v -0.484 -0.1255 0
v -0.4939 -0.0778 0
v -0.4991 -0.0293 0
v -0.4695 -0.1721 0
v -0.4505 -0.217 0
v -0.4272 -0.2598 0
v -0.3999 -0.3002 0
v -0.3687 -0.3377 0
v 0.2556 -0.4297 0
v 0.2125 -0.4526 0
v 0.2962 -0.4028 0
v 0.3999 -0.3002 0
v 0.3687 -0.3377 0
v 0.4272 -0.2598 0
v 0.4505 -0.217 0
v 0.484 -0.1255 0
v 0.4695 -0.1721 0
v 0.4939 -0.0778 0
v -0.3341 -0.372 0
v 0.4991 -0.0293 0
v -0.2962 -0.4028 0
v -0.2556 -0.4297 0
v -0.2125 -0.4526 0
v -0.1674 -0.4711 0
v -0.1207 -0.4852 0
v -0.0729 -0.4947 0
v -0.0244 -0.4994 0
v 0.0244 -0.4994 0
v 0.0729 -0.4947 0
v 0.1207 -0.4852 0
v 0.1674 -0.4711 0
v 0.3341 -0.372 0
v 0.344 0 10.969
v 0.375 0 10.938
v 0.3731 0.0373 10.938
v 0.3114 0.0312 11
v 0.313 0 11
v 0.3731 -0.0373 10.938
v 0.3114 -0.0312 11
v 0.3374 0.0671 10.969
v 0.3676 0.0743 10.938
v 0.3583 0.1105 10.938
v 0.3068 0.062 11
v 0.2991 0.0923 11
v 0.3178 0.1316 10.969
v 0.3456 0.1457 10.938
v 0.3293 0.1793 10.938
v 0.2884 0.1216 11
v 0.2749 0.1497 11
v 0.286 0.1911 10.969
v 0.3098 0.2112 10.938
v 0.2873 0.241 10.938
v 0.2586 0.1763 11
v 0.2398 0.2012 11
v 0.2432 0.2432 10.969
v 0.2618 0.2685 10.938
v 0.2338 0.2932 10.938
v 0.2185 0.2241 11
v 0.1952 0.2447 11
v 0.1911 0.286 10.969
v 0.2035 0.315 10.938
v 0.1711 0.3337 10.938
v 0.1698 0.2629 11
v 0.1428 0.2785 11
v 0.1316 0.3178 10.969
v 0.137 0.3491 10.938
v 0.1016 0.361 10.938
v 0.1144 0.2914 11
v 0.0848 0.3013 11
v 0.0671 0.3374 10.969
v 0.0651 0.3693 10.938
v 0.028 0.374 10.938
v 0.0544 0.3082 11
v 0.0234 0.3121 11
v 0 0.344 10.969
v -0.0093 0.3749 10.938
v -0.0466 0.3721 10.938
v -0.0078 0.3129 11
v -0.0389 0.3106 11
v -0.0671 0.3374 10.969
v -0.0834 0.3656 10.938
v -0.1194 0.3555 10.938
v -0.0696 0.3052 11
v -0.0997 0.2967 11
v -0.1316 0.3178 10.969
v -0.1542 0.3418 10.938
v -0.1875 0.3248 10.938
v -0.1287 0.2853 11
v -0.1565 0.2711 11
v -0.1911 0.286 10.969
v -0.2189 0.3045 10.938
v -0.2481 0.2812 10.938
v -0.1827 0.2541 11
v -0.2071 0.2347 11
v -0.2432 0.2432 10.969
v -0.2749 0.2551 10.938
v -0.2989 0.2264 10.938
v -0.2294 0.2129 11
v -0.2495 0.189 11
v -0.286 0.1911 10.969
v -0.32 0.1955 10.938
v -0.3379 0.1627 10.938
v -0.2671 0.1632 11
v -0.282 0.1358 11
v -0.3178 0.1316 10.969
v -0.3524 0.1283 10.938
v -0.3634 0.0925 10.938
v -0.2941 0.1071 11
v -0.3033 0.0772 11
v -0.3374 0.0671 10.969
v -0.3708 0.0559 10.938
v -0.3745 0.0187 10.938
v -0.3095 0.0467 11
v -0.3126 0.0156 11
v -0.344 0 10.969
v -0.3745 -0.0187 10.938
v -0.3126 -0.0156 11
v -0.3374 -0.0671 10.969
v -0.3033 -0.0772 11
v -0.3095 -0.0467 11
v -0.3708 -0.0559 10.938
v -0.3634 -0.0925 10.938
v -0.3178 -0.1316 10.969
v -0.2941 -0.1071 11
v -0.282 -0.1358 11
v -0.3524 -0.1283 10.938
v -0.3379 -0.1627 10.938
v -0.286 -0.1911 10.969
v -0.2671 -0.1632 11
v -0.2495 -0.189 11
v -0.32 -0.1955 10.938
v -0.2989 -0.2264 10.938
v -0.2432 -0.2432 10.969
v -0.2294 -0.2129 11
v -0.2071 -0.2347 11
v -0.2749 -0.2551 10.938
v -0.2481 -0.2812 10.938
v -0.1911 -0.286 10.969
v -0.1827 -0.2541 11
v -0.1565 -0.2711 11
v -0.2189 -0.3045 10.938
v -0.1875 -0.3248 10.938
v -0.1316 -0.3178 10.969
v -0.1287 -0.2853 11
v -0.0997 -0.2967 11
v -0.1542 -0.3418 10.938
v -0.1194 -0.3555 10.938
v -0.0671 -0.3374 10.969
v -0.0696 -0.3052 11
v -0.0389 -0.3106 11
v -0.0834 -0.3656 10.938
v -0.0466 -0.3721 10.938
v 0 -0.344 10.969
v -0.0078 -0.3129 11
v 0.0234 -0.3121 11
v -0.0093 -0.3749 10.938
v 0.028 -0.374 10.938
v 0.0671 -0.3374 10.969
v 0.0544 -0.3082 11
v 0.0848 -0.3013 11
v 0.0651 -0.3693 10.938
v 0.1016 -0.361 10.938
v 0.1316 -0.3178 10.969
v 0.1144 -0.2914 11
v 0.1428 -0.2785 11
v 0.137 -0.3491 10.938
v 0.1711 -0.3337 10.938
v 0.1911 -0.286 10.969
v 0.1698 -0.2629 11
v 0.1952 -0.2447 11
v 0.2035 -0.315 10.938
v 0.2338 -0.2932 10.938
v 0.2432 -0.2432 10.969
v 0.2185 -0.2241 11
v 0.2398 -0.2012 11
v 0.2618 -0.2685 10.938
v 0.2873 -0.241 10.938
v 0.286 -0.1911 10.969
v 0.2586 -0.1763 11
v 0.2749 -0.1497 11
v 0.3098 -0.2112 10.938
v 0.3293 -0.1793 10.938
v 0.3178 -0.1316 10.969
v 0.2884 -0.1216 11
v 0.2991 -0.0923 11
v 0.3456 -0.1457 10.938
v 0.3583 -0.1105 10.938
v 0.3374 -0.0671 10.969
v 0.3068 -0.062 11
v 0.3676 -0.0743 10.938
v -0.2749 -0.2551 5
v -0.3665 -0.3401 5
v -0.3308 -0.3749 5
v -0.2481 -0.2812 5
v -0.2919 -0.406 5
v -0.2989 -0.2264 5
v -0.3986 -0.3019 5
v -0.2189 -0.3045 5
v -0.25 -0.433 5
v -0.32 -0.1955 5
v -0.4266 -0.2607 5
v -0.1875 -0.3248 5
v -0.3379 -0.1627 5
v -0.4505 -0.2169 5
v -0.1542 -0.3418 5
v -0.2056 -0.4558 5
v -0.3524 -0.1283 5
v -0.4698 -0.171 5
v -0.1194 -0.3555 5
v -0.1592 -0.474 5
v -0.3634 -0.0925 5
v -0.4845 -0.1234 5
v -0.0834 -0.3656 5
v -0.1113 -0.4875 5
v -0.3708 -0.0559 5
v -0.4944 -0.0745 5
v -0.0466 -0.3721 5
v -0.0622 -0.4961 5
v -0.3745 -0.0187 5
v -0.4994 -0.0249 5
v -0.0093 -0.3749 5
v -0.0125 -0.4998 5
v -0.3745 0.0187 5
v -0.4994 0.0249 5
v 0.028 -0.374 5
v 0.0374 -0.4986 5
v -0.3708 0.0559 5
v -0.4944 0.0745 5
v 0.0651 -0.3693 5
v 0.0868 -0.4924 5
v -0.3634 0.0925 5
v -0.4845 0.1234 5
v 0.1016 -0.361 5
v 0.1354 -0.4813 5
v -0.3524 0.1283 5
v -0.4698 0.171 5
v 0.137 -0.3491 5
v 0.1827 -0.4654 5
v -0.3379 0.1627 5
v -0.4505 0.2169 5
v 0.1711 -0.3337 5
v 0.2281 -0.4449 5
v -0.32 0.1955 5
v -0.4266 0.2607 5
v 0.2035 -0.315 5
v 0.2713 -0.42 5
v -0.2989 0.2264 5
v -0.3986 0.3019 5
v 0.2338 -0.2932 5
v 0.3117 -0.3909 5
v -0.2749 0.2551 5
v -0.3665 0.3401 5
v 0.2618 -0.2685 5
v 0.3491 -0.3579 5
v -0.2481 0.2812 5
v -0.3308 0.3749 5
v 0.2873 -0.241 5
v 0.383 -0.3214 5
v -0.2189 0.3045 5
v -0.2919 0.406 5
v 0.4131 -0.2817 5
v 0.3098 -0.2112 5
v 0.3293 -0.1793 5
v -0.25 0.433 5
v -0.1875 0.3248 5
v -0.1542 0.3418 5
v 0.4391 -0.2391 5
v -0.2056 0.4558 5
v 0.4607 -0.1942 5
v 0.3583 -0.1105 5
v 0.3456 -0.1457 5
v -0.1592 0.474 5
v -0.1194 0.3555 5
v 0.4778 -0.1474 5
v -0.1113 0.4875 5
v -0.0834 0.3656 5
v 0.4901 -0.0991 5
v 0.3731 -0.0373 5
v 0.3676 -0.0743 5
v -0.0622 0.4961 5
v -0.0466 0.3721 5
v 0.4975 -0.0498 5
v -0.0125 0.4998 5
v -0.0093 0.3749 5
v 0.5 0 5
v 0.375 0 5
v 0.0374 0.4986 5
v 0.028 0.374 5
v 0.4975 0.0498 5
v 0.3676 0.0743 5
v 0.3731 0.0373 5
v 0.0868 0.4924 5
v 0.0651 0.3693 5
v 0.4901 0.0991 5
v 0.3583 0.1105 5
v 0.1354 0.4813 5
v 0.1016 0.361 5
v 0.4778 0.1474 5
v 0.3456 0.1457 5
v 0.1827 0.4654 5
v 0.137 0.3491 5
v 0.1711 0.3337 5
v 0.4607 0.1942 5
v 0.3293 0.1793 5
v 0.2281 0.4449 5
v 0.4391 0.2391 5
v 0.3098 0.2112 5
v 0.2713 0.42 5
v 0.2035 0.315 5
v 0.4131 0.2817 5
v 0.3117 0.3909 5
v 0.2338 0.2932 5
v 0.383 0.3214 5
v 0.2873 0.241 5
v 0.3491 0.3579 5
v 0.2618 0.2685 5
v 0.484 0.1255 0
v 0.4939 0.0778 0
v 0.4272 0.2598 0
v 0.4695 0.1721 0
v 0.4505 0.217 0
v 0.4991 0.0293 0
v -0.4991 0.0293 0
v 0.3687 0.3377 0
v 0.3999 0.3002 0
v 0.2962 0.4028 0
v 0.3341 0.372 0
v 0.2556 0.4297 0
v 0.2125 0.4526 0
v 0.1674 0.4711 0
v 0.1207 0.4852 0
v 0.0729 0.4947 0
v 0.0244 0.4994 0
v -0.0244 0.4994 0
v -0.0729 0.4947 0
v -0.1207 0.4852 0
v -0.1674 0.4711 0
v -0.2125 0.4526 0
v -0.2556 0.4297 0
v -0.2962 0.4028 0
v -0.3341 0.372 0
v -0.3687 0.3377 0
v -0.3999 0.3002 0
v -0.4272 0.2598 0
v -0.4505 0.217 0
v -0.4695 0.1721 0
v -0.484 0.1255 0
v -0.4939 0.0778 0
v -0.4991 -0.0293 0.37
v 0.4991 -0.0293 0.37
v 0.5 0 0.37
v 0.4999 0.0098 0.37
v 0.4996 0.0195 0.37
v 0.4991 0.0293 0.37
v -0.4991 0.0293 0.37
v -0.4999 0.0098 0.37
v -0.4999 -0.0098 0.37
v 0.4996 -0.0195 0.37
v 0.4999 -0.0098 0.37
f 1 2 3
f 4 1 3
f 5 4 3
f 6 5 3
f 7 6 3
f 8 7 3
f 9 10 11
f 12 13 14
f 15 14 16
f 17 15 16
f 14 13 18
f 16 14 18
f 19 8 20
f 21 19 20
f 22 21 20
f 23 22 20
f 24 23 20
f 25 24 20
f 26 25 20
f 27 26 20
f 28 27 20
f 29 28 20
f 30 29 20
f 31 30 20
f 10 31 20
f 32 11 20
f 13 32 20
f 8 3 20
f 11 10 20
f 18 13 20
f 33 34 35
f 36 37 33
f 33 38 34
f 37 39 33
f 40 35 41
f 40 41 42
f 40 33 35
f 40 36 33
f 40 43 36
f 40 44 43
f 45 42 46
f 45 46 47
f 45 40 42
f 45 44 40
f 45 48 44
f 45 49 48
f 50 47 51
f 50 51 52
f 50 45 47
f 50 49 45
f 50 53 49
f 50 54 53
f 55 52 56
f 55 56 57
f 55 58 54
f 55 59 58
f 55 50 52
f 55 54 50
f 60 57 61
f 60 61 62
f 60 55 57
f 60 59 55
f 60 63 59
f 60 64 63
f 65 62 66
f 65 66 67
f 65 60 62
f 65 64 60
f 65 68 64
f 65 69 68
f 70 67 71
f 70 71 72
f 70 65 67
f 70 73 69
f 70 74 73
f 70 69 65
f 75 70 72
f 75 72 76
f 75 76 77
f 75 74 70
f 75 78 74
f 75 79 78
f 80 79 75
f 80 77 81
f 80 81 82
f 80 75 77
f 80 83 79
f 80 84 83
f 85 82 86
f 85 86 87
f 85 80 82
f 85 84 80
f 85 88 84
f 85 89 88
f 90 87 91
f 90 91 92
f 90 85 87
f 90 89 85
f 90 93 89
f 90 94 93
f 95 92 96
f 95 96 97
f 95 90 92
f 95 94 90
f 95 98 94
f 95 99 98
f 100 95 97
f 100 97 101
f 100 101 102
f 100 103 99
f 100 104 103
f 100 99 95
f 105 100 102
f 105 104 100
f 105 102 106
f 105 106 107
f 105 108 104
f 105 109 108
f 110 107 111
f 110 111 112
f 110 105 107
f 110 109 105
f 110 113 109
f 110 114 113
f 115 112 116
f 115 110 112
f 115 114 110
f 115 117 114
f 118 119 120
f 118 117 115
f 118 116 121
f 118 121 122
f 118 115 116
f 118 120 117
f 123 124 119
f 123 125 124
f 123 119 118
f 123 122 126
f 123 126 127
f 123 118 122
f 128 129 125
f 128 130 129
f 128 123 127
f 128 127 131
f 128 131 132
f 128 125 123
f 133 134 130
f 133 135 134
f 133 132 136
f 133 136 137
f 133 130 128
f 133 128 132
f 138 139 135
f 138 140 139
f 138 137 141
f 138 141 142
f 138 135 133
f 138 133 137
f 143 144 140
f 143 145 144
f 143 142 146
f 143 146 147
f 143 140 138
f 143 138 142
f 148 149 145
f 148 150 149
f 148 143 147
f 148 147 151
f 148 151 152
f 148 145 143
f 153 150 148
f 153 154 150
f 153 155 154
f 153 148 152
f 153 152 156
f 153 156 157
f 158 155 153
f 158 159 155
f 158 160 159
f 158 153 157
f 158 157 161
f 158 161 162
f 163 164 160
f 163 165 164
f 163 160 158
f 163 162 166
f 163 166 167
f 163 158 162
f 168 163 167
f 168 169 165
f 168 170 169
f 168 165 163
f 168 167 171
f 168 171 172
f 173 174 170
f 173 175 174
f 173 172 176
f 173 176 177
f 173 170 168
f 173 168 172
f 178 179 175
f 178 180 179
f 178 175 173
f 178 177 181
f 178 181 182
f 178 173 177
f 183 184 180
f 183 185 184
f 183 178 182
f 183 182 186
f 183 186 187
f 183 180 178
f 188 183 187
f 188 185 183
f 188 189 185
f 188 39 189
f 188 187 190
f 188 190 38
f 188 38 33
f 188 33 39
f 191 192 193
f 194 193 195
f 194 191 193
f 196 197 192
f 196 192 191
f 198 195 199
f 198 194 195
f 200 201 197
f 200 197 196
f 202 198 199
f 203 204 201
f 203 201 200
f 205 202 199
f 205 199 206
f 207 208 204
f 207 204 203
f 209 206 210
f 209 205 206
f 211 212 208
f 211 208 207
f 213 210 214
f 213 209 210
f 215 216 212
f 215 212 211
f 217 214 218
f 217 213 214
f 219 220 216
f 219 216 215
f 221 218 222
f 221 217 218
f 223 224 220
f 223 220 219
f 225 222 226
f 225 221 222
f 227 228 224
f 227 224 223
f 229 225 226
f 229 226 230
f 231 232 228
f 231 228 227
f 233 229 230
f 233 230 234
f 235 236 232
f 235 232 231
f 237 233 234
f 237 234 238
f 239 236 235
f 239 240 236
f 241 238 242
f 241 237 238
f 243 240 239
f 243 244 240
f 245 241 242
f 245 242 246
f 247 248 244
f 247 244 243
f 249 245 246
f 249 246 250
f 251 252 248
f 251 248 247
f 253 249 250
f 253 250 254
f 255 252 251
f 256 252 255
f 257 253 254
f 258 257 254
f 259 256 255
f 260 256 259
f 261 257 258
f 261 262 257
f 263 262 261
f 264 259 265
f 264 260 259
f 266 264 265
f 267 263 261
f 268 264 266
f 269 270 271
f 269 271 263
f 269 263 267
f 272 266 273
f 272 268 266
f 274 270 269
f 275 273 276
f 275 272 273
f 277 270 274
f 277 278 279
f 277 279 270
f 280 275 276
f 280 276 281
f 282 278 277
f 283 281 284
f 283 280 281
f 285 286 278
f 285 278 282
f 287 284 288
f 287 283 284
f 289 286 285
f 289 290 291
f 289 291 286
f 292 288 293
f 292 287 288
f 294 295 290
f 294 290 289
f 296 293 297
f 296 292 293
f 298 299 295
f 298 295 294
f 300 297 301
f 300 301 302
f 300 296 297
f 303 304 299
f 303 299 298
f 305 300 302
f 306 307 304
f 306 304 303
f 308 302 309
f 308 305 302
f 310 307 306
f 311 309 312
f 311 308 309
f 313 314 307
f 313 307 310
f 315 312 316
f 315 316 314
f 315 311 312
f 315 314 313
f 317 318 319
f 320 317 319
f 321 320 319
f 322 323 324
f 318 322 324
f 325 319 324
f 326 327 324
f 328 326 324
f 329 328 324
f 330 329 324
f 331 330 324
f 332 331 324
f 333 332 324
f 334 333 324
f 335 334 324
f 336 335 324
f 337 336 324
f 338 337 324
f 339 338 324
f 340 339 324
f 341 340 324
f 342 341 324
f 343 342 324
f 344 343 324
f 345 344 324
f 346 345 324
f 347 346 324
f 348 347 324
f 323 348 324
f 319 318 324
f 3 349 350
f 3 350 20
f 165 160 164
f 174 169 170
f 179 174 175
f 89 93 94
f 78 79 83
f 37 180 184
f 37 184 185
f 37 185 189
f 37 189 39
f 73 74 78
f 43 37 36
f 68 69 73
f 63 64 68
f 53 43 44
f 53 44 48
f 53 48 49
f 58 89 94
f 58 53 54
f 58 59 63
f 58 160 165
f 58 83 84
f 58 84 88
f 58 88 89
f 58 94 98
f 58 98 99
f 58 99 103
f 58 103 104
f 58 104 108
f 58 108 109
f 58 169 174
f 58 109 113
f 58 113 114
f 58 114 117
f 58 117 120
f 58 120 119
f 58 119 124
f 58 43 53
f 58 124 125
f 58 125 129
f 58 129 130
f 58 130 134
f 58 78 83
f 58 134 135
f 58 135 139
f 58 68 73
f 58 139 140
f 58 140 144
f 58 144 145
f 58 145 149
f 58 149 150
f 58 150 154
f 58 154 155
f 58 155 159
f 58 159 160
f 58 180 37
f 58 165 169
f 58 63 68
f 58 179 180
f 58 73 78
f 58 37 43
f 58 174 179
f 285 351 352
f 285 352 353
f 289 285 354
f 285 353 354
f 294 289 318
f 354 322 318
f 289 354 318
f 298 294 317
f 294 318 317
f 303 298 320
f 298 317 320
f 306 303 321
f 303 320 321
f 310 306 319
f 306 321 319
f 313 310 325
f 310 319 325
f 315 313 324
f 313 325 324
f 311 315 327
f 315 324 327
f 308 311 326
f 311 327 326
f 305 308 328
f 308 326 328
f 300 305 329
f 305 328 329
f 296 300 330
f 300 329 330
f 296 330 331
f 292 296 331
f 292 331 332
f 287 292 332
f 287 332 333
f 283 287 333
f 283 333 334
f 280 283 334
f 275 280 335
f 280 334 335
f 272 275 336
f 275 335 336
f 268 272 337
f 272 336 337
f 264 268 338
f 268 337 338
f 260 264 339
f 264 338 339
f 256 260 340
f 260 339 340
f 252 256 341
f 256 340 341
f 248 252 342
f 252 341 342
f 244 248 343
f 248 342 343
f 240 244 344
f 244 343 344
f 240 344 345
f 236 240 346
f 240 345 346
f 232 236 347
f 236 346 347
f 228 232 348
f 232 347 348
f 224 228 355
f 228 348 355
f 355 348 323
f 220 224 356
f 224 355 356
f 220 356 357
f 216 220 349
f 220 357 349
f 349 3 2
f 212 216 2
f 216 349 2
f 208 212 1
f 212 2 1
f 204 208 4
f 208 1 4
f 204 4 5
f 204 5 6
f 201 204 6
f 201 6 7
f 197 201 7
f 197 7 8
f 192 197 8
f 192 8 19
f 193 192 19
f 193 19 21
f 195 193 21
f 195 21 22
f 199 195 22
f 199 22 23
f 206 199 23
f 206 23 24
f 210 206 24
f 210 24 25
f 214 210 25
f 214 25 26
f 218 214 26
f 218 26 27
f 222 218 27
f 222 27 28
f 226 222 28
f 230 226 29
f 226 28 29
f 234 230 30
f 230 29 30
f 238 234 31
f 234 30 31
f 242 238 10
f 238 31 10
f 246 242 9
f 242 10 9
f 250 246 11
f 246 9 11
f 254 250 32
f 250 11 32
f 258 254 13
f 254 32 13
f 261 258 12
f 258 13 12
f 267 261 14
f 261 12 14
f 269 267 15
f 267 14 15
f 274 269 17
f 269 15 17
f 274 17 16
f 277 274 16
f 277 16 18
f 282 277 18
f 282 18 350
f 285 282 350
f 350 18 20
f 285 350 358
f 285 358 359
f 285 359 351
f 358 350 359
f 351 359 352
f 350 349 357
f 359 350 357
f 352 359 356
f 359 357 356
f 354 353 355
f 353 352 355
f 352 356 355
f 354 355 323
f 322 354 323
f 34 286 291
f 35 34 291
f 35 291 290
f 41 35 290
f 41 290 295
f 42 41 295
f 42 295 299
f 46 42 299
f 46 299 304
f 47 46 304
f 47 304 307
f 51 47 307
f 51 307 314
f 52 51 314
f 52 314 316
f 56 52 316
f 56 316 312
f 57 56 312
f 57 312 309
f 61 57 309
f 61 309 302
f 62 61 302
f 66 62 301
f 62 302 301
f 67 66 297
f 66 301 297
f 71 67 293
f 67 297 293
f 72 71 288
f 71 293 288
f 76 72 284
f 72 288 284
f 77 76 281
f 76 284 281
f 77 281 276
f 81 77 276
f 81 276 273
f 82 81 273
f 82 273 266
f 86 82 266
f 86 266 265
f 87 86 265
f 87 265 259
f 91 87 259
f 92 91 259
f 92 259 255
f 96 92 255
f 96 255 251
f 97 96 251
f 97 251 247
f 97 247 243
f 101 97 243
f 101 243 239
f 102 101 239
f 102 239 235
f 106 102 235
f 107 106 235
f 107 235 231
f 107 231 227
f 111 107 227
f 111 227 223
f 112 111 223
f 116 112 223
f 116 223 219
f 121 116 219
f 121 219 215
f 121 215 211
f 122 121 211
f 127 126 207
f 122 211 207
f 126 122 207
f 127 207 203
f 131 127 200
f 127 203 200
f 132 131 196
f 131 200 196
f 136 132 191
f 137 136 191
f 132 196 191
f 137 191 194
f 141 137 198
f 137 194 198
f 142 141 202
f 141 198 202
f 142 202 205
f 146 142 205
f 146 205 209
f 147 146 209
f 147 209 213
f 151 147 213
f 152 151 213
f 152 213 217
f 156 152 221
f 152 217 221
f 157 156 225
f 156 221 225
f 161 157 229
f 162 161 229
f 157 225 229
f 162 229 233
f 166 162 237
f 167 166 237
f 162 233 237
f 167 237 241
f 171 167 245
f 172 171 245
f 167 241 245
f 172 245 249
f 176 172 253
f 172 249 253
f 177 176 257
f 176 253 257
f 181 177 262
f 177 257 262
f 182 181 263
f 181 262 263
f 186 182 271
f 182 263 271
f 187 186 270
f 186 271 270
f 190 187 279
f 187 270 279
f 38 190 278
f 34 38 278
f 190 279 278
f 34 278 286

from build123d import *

# Parameters (mm, degrees)
SKETCH1_R               = 0.5
BOSS_EXTRUDE1_DEPTH     = 5
SKETCH1_3_R             = 0.375
BOSS_EXTRUDE2_DEPTH     = 11
CHAMFER1_SIZE           = 0.062
CUT_EXTRUDE1_DEPTH      = 12.022703843
CUT_EXTRUDE1_DEPTH_BACK = 12.022703843
SKETCH2_W               = 0.74
SKETCH2_H               = 0.05859


with BuildPart() as part:
    # Sketch1 → Boss-Extrude1 (new body)
    with BuildSketch(Plane.XY):
        Circle(SKETCH1_R)
    extrude(amount=BOSS_EXTRUDE1_DEPTH)

    # Sketch1<3> → Boss-Extrude2 (add)
    with BuildSketch(Plane.XY):
        Circle(SKETCH1_3_R)
    extrude(amount=BOSS_EXTRUDE2_DEPTH)

    # Chamfer1
    chamfer1_edges = [part.edges().sort_by_distance(p)[0] for p in [
        (-0.375, 0, 11),
    ]]
    chamfer(chamfer1_edges, length=CHAMFER1_SIZE)

    # Sketch2 → Cut-Extrude1 (cut, two sides: drawn at the far end of the back side and taken through both)
    with BuildSketch(Plane(origin=(0, 0, 0), x_dir=(0, 0, -1), z_dir=(1, 0, 0)).offset(-CUT_EXTRUDE1_DEPTH_BACK)):
        Rectangle(SKETCH2_W, SKETCH2_H)
    extrude(amount=CUT_EXTRUDE1_DEPTH + CUT_EXTRUDE1_DEPTH_BACK, mode=Mode.SUBTRACT)


solid = part.part
